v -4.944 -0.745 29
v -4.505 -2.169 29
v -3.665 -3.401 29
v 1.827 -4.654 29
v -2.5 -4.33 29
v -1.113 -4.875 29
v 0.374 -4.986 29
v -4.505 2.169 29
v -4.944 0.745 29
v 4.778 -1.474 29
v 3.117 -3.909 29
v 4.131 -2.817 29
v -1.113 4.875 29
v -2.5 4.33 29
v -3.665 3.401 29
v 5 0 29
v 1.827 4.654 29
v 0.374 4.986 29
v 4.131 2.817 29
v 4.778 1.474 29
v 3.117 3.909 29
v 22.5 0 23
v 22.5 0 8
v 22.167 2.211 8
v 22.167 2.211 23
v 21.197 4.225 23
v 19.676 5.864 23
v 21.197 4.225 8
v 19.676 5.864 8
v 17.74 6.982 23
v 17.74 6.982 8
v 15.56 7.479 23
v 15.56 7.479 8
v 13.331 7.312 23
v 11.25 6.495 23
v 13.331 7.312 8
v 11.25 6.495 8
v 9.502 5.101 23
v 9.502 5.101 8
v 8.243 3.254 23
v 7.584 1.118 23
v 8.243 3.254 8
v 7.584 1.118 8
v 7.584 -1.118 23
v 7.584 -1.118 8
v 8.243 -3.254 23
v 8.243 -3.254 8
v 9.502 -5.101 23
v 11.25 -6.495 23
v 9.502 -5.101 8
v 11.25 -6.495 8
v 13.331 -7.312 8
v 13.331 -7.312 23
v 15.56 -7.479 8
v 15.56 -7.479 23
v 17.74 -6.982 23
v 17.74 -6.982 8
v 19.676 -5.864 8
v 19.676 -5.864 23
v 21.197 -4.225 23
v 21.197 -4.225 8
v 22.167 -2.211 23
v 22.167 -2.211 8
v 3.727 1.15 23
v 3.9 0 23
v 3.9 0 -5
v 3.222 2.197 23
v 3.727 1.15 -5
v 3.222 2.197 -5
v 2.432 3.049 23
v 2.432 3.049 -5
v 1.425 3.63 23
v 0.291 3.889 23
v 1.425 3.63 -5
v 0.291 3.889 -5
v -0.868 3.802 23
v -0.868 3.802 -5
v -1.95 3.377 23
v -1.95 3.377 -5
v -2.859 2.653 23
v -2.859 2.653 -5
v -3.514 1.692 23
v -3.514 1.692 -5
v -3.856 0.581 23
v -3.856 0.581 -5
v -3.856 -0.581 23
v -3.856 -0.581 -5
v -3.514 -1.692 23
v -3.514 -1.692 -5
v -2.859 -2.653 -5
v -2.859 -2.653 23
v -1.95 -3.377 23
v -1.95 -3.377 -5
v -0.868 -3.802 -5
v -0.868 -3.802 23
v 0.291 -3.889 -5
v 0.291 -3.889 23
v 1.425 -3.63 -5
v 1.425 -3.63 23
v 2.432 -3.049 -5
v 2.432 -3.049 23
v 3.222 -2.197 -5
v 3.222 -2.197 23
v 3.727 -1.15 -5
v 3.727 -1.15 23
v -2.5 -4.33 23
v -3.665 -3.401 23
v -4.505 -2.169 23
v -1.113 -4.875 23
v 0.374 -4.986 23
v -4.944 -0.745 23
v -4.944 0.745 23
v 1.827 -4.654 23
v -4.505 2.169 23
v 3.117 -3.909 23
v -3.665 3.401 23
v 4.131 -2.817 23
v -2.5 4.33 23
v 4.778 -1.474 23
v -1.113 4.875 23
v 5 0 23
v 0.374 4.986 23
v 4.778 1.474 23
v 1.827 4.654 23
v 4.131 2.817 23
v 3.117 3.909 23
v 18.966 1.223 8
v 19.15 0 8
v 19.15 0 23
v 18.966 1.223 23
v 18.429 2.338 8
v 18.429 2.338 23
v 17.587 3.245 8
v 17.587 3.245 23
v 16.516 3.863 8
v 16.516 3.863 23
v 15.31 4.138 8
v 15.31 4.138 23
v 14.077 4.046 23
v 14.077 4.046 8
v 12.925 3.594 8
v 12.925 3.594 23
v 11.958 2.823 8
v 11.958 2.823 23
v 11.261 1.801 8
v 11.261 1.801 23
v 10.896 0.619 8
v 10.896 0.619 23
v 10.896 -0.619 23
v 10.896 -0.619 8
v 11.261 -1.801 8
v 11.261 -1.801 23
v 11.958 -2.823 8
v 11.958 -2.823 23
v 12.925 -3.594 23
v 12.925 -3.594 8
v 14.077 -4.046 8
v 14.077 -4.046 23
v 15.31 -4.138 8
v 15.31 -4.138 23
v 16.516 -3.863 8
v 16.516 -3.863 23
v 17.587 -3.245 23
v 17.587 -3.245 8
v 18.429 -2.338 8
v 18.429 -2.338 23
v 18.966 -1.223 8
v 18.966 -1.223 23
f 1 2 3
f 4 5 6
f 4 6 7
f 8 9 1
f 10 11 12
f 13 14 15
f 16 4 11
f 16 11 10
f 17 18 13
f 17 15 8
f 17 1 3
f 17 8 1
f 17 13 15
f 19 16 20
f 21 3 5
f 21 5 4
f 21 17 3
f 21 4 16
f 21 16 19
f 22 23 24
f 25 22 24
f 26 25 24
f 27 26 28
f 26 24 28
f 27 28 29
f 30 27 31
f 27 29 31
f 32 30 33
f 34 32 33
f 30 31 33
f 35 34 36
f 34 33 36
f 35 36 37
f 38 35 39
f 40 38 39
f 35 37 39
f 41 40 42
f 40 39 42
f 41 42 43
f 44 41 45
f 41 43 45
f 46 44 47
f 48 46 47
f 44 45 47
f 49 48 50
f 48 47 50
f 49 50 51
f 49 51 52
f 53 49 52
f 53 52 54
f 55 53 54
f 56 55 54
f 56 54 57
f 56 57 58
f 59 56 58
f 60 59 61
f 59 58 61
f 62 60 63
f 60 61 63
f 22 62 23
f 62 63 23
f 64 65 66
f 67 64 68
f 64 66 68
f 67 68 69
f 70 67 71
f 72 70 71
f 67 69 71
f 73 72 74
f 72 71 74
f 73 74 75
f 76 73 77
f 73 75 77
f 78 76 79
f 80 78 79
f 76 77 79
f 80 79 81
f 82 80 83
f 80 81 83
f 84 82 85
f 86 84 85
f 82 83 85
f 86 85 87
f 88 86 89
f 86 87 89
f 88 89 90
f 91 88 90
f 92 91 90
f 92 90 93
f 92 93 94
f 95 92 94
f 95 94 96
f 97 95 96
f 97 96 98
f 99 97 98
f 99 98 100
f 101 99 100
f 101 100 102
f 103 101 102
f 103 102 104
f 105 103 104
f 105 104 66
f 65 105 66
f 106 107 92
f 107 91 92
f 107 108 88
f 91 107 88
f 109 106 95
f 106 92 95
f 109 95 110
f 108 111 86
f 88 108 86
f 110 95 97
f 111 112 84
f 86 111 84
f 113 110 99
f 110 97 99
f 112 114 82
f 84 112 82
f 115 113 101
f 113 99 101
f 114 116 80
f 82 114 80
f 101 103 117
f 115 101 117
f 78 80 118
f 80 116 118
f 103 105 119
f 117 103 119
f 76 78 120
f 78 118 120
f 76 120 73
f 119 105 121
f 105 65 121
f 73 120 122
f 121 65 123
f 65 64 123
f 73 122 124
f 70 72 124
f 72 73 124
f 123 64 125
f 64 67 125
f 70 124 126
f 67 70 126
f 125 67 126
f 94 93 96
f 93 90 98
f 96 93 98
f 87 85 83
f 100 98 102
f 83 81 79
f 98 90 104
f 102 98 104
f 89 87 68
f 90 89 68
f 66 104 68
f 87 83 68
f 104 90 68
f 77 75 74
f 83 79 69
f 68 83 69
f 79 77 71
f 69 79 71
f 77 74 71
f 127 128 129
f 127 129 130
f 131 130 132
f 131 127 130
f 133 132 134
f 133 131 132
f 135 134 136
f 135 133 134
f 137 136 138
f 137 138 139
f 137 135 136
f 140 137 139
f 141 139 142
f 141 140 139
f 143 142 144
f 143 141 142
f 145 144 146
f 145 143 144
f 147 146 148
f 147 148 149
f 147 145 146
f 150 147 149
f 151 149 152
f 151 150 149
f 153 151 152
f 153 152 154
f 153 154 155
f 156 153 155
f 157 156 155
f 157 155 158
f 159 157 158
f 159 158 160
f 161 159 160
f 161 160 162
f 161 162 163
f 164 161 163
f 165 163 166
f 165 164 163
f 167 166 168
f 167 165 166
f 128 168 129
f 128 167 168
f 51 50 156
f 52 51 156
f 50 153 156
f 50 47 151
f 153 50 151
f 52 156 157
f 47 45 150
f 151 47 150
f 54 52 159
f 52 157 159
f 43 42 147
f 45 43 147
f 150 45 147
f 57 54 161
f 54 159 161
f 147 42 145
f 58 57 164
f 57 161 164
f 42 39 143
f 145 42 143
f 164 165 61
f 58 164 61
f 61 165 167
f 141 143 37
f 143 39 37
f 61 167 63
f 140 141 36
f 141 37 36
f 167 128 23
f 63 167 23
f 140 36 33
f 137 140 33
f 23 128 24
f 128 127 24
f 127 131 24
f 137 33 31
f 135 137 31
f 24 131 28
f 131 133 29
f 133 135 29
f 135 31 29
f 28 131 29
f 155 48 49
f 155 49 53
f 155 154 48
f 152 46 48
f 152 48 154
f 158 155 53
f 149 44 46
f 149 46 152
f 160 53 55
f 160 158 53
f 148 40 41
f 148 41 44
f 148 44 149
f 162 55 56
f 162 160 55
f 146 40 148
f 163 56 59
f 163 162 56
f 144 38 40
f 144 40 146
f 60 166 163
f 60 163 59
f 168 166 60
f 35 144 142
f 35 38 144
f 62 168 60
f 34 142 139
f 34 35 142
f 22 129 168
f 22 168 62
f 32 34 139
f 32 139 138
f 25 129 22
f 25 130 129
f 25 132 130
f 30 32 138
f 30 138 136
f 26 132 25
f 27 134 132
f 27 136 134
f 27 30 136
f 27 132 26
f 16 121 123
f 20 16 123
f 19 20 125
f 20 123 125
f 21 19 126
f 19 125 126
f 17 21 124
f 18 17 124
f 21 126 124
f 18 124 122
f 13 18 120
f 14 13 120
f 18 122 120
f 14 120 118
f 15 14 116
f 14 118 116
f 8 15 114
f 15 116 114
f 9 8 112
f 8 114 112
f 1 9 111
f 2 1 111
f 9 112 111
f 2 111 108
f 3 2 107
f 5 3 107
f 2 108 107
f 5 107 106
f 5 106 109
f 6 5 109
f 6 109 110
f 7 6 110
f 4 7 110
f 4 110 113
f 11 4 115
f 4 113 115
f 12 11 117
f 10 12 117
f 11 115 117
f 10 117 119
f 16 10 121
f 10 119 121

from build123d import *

# Parameters (mm, degrees)
TUBE_R         = 7.5
TUBE_R_2       = 4.15
TUBE_DEPTH     = 15
TUBE001_R      = 5
TUBE001_R_2    = 3.9
TUBE001_DEPTH  = 6
CYLINDER_R     = 3.9
CYLINDER_DEPTH = 34


with BuildPart() as tube:
    # Tube → Tube (new body)
    with BuildSketch(Plane(origin=(15, 0, 8), x_dir=(1, 0, 0), z_dir=(0, 0, 1))):
        Circle(TUBE_R)
        Circle(TUBE_R_2, mode=Mode.SUBTRACT)
    extrude(amount=TUBE_DEPTH)


with BuildPart() as tube001:
    # Tube001 → Tube001 (new body)
    with BuildSketch(Plane.XY.offset(23)):
        Circle(TUBE001_R)
        Circle(TUBE001_R_2, mode=Mode.SUBTRACT)
    extrude(amount=TUBE001_DEPTH)


with BuildPart() as fusion:
    # Cylinder → Cylinder (new body)
    with BuildSketch(Plane.XY.offset(-5)):
        Circle(CYLINDER_R)
    extrude(amount=CYLINDER_DEPTH)

    # Fusion: union Tube001
    add(tube001.part)


solid = Compound([tube.part, fusion.part])
